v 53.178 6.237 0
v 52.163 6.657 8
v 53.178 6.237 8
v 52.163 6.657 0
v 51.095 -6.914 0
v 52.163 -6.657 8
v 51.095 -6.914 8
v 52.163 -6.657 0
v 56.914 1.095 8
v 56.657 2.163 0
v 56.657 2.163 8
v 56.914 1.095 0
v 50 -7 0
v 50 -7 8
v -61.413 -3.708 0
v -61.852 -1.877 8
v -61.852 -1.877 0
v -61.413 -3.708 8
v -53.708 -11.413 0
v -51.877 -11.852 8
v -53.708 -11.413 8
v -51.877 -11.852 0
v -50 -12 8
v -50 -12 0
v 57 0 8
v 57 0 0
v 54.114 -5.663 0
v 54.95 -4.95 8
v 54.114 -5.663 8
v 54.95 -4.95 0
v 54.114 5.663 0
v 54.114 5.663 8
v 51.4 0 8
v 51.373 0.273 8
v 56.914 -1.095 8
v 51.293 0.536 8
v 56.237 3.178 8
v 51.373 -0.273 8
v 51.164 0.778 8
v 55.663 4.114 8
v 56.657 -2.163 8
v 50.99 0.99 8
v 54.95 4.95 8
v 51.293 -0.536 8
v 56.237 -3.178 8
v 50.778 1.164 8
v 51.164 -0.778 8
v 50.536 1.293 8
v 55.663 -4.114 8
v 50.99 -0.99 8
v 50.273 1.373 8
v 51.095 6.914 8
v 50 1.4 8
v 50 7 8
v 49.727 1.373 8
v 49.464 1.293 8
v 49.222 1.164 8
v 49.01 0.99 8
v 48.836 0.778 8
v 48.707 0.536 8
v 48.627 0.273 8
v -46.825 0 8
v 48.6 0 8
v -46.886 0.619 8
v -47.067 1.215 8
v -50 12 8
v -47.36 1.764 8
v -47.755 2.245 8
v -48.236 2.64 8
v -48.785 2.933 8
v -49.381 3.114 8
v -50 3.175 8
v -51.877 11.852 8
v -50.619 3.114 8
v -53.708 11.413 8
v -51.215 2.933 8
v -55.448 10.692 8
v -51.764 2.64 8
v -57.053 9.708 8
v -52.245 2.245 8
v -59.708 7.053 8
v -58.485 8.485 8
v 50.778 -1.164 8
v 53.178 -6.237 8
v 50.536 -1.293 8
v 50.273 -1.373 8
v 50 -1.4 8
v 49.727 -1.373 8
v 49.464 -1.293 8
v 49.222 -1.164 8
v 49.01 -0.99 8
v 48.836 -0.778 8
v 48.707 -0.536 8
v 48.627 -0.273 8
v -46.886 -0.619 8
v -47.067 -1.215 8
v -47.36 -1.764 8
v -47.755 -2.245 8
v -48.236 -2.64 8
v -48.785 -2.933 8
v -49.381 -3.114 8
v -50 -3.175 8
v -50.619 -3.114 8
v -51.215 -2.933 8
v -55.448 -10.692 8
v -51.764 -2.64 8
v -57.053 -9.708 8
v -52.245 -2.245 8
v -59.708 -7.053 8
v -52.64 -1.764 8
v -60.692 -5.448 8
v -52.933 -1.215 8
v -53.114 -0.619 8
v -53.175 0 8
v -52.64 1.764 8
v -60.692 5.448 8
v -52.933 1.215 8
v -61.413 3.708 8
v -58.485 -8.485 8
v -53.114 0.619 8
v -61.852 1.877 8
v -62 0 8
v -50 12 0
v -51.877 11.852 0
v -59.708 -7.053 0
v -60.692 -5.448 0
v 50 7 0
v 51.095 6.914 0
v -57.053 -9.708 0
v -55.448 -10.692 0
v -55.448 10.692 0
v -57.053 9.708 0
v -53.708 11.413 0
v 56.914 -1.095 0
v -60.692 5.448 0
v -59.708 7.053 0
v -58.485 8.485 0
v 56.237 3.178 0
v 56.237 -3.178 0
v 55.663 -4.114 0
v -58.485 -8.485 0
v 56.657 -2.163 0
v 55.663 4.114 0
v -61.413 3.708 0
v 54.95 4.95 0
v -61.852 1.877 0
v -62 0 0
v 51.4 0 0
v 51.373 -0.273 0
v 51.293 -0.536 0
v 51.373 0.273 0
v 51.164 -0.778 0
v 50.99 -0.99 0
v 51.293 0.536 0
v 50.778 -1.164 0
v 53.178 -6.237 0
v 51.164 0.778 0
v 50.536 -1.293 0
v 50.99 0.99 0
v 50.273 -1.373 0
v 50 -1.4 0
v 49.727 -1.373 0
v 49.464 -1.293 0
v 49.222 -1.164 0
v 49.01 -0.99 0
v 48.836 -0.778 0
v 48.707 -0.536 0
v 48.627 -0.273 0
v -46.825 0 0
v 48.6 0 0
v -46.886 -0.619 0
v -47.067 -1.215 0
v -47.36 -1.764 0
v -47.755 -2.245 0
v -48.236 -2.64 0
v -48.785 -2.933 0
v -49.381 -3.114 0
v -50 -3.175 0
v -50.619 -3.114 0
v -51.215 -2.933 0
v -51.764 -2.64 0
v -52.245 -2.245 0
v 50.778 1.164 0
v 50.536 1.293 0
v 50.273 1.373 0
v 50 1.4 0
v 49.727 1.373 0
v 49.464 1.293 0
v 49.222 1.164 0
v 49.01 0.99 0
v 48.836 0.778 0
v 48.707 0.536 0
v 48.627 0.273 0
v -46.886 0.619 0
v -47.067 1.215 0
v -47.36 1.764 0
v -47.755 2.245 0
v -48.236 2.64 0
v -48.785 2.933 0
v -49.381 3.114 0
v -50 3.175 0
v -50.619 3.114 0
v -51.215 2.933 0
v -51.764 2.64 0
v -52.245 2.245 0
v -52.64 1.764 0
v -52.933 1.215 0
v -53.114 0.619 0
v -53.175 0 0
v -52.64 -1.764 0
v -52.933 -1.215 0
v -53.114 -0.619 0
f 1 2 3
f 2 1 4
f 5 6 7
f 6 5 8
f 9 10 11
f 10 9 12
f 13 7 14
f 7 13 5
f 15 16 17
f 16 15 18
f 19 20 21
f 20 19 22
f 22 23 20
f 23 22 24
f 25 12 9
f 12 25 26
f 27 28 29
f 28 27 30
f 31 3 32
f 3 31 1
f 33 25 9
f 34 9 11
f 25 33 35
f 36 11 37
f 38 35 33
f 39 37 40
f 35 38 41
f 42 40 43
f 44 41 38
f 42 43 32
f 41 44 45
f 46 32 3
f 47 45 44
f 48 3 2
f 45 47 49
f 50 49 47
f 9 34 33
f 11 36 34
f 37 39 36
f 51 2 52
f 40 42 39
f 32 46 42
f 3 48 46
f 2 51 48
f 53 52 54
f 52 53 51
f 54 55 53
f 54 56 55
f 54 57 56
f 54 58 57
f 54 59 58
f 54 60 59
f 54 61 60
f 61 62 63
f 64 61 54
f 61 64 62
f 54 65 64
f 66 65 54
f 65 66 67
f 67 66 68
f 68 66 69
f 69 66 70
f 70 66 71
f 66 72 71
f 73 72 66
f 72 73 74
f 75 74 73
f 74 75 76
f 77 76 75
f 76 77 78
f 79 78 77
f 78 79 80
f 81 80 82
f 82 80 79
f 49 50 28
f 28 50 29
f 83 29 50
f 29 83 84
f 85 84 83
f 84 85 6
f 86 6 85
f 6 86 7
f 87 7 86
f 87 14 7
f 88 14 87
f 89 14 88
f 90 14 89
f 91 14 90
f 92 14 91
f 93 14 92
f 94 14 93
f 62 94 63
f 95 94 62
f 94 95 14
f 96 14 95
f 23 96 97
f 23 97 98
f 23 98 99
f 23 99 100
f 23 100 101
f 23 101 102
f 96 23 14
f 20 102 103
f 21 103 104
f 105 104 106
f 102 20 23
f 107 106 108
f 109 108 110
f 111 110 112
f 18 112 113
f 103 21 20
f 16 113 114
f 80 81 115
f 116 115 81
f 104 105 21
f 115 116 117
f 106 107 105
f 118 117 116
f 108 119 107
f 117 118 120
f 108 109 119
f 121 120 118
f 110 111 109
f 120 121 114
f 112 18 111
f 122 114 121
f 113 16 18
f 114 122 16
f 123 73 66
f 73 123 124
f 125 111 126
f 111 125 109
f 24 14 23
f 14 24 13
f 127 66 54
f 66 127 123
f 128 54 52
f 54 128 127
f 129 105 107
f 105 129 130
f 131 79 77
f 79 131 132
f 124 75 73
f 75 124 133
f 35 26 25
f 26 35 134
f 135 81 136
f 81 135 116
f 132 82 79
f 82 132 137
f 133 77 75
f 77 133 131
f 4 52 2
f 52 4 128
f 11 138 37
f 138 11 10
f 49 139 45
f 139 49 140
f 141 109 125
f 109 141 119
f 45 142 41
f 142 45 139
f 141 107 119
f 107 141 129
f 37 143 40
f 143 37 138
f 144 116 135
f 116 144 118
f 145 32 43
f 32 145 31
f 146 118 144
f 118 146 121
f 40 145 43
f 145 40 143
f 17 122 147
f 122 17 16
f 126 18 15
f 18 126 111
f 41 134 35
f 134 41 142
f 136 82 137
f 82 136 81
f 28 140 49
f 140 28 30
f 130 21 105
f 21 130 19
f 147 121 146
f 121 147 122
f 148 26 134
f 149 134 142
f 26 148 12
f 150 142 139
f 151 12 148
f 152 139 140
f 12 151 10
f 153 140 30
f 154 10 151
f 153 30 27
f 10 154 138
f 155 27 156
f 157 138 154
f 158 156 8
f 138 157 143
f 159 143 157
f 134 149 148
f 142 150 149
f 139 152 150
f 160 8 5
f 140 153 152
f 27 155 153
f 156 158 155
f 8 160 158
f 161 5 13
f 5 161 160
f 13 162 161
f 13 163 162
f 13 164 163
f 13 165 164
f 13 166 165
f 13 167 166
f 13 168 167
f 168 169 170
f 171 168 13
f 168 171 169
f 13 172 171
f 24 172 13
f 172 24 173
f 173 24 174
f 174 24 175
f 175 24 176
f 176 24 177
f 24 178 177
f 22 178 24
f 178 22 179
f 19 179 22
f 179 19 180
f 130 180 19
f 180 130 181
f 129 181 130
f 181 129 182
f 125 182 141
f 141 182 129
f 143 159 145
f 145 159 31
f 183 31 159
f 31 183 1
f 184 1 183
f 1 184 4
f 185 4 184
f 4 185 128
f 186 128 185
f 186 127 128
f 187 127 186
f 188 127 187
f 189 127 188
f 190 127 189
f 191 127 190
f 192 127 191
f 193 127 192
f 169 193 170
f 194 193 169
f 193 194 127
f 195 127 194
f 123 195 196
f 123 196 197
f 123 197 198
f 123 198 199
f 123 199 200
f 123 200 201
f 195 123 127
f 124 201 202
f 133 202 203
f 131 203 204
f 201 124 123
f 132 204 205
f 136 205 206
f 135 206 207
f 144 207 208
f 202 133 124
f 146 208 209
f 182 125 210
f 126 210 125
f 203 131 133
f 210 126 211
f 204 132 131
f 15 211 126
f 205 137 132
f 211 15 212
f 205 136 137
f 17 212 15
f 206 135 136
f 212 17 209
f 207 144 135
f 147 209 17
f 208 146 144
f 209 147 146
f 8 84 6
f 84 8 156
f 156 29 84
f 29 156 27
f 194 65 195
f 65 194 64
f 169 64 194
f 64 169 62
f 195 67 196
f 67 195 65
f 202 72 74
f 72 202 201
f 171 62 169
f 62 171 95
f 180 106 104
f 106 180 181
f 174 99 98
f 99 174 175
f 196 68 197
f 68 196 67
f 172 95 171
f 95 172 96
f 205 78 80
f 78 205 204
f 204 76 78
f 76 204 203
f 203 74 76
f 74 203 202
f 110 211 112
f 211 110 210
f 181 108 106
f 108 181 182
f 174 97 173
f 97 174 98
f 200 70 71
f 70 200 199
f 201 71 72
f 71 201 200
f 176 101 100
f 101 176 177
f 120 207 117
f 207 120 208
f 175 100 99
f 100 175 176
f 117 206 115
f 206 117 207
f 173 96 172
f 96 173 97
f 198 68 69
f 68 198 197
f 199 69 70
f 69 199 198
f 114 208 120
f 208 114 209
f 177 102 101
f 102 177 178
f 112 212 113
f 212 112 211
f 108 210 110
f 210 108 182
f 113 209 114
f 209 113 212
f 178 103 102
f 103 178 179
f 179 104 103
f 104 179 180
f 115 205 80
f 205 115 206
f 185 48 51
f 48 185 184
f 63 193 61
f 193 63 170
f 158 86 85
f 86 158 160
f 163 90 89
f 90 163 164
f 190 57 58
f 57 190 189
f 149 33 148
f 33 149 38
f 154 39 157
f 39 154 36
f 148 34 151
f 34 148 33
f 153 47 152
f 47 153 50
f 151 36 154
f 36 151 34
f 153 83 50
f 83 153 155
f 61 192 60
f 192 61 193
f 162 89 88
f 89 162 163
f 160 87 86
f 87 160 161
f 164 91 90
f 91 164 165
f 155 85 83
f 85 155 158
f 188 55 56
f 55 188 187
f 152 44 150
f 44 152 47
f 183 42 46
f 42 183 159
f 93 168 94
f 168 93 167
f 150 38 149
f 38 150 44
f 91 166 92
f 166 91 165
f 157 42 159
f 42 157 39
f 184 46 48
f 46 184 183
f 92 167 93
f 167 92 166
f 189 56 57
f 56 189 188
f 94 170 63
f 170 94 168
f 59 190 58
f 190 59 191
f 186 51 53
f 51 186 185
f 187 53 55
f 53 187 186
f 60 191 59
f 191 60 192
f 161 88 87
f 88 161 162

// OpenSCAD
$fn = 32;

// ----------------------------------------------------------------------
// Lever: 100 mm between the bosses, 8 mm thick, smooth outline
// ----------------------------------------------------------------------

// --- parameters (mm) ---
lever_l = 100;            // distance between the boss centres
boss_a = 24;              // first boss diameter
boss_b = 14;              // second boss diameter
bore_a = 6.35;            // first bore
bore_b = 2.8;             // second bore
lever_t = 8;              // lever thickness

lever_profile = [[-62, 0], [-61.852, -1.877], [-61.413, -3.708], [-60.692, -5.448], [-59.708, -7.053], [-58.485, -8.485], [-57.053, -9.708], [-55.448, -10.692], [-53.708, -11.413], [-51.877, -11.852], [-50, -12], [50, -7], [51.095, -6.914], [52.163, -6.657], [53.178, -6.237], [54.114, -5.663], [54.95, -4.95], [55.663, -4.114], [56.237, -3.178], [56.657, -2.163], [56.914, -1.095], [57, 0], [56.914, 1.095], [56.657, 2.163], [56.237, 3.178], [55.663, 4.114], [54.95, 4.95], [54.114, 5.663], [53.178, 6.237], [52.163, 6.657], [51.095, 6.914], [50, 7], [-50, 12], [-51.877, 11.852], [-53.708, 11.413], [-55.448, 10.692], [-57.053, 9.708], [-58.485, 8.485], [-59.708, 7.053], [-60.692, 5.448], [-61.413, 3.708], [-61.852, 1.877]];

difference() {
  linear_extrude(height = lever_t) polygon(lever_profile);
  translate([-50, 0, -2.5]) cylinder(h = lever_t + 5, d = bore_a);
  translate([50, 0, -2.5]) cylinder(h = lever_t + 5, d = bore_b);
}
